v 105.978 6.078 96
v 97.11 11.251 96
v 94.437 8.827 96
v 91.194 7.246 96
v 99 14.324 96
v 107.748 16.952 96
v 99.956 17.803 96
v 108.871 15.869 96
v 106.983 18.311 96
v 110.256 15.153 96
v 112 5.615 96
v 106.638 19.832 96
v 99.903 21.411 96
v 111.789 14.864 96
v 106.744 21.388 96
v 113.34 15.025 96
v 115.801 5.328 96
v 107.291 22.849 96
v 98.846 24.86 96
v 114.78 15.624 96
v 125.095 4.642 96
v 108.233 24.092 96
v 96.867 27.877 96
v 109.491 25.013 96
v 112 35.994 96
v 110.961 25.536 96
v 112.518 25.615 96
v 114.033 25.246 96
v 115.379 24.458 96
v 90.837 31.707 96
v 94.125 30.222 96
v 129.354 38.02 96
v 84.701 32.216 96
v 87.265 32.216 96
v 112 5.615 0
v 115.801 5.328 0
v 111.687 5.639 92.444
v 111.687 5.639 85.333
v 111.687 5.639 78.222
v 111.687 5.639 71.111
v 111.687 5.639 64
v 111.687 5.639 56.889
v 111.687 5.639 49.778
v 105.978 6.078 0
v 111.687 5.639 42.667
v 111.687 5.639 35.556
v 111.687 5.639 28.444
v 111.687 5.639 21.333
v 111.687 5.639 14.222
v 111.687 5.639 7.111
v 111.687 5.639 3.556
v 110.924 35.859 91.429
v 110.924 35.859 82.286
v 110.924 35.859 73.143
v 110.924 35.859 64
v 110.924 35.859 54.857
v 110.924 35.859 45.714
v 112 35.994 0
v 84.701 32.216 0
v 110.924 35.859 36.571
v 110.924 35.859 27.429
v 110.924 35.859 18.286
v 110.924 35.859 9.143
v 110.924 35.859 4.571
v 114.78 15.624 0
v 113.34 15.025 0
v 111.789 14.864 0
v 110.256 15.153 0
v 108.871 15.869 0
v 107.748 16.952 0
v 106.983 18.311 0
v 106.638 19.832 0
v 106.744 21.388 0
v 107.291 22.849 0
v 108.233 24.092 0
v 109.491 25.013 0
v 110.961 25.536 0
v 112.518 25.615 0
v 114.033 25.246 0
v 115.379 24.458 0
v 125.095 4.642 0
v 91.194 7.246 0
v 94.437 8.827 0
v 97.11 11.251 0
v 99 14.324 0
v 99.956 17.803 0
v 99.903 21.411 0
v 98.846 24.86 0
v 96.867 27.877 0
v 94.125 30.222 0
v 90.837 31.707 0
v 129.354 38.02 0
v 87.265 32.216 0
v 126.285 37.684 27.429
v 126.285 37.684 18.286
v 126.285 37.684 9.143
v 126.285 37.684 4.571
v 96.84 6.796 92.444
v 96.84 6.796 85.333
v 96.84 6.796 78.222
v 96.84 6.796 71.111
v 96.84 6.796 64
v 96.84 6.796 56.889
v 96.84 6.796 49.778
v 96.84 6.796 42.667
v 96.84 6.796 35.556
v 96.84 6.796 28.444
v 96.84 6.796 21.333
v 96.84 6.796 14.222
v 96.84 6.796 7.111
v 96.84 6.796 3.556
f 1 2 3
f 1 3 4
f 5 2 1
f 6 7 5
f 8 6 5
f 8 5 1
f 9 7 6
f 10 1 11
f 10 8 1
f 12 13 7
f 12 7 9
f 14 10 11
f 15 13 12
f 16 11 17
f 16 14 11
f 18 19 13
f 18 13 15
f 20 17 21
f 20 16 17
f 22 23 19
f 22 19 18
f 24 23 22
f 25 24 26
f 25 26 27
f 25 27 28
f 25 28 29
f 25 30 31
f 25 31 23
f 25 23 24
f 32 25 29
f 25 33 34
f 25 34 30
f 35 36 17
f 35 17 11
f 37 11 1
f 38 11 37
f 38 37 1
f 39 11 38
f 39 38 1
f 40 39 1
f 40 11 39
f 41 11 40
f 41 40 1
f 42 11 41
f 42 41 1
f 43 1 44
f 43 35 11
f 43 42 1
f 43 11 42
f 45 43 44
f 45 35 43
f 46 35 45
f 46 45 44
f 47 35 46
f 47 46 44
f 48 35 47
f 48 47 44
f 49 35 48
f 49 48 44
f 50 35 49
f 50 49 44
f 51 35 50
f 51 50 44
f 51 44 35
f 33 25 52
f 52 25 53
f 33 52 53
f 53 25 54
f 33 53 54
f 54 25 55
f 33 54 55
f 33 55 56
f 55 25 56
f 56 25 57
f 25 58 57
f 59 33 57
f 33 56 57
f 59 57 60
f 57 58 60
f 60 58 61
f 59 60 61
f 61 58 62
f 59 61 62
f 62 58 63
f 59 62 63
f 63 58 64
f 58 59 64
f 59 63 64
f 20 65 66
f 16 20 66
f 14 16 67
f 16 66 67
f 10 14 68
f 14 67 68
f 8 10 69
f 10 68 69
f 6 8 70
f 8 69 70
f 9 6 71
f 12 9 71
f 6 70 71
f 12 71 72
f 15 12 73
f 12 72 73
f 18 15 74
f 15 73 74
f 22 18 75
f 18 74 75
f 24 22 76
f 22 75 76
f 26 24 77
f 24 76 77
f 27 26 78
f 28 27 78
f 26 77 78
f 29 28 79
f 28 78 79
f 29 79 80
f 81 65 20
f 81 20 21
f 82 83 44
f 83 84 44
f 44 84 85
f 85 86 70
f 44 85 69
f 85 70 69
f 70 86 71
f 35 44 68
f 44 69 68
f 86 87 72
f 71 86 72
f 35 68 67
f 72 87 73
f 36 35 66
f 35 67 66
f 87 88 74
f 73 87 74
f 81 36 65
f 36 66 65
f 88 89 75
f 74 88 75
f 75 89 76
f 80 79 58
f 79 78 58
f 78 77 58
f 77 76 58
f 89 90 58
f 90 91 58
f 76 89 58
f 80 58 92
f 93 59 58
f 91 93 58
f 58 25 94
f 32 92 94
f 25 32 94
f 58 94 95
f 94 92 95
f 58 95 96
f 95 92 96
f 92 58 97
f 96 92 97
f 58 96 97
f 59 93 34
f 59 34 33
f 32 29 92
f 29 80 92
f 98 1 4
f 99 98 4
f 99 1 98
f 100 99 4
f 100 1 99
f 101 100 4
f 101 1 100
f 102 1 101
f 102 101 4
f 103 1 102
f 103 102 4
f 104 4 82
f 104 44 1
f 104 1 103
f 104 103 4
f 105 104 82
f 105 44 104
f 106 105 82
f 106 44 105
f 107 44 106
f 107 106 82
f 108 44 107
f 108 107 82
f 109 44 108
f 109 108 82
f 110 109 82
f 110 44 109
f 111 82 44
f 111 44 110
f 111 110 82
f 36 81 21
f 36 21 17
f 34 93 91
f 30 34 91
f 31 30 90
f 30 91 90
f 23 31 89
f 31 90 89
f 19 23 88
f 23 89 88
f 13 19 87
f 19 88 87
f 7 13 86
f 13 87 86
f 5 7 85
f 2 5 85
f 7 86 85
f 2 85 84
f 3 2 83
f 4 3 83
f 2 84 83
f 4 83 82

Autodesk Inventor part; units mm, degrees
ref_plane "YZ Plane" through (0, 0, 0) normal (1, 0, 0) x (0, 1, 0)
ref_plane "XZ Plane" through (0, 0, 0) normal (0, 1, 0) x (-1, 0, 0)
ref_plane "XY Plane" through (0, 0, 0) normal (0, 0, 1) x (1, 0, 0)
sketch "Sketch1" plane through (0, 0, 0) normal (0, 0, 1) x (1, 0, 0)
  spline S0 degree 4 poles (254.4361, 38.2581) (252.1599, 38.6503) (246.7887, 39.4993) (237.9849, 40.6183) (225.3575, 41.7043) (211.2027, 42.3417) (196.3926, 42.4701) (181.0313, 42.0702) (165.5064, 41.2217) (149.7852, 40.0448) (134.1096, 38.5775) (118.6247, 36.8508) (103.5, 34.9393) (88.9016, 32.8834) (74.9958, 30.7382) (61.9178, 28.5627) (49.8271, 26.4098) (38.8354, 24.34) (29.0772, 22.4039) (20.6323, 20.6564) (13.6456, 19.1491) (6.9132, 17.6607) (2.9022, 16.74) (0.4691, 16.1882) (0, 16.065) knots 0.214297 0.214297 0.214297 0.214297 0.214297 0.24332 0.281775 0.321542 0.36238 0.404005 0.446178 0.488665 0.531231 0.573688 0.615803 0.657336 0.698047 0.737682 0.775986 0.812688 0.847495 0.880087 0.910093 0.937059 0.960363 1 1 1 1 1
  spline S1 degree 4 poles (300, 15.624) (299.8057, 13.313) (297.7085, 10.3432) (293.0509, 7.5008) (285.3959, 4.883) (278.1124, 3.2165) (269.5147, 1.8925) (259.681, 0.913) (248.7129, 0.2783) (236.7119, -0.0309) (223.8067, -0.0504) (210.1253, 0.1933) (195.7754, 0.645) (180.9677, 1.2494) (165.6517, 1.9825) (150.1916, 2.9048) (134.6873, 3.9451) (119.3375, 5.0495) (104.3042, 6.1987) (89.7566, 7.3561) (75.8492, 8.4887) (62.7429, 9.5824) (50.5811, 10.6226) (39.4971, 11.5797) (29.6294, 12.4513) (21.0712, 13.2264) (13.9639, 13.8721) (7.1036, 14.5126) (2.9683, 14.8997) (0.533, 15.1397) (-0.0042, 15.1841) knots 0 0 0 0 0 0.054372 0.079821 0.107912 0.138499 0.171341 0.206187 0.242784 0.280891 0.320277 0.360713 0.402023 0.443985 0.486373 0.528958 0.57146 0.613642 0.655265 0.696085 0.735853 0.774308 0.811174 0.846157 0.87893 0.909115 0.936252 0.959711 1 1 1 1 1
  arc A0 (0, 16.065) -> (-0.0042, 15.1841) centre (0.1158, 15.624) ccw
  line L0 (0.1158, 15.624) -> (227.9902, 15.624) construction
  line L1 (300, 15.624) -> (0.1158, 15.624) construction
  line L2 (300, 15.624) -> (200, 15.624) construction
  line L3 (200, 15.624) -> (200, 42.3773) construction
  line L4 (200, 15.624) -> (200, 0.5273)
  line L5 (0, 0) -> (0, 20.241)
  line L6 (0, 20.241) -> (238.581, 20.241) construction
  circle A1 centre (238.581, 20.241) radius 14
  line L7 (238.581, 20.241) -> (208.581, 20.241)
  line L8 (238.581, 25.359) -> (238.581, 20.241)
  line L9 (0, 20.241) -> (112, 20.241) construction
  line L10 (0, 15.624) -> (112, 15.624) construction
  line L11 (0, 15.624) -> (112, 15.624) construction
  line L12 (112, 15.624) -> (112, 35.9945)
  line L13 (112, 15.624) -> (112, 5.6153)
  spline S2 degree 4 poles (299.2852, 20.241) (299.2279, 20.1316) (299.168, 20.0232) (299.1056, 19.9158) (299.0406, 19.8092) knots 0.014818 0.014818 0.014818 0.014818 0.014818 0.017711 0.017711 0.017711 0.017711 0.017711
  line L14 (299.2071, 20.0822) -> (298.8742, 19.5363) construction
  arc A2 (298.904, 19.5932) -> (299.1702, 20.0296) centre (292.2911, 23.9254) ccw construction
  line L15 (299.432, 20.5214) -> (299.1384, 19.9606) construction
  arc A3 (299.1639, 20.0188) -> (299.3987, 20.4672) centre (292.801, 23.6361) ccw construction
  spline S3 degree 2 poles (295.8506, 16.56) (295.1573, 16.0692) (294.3933, 15.624) knots 0 0 0 1 1 1
  line L16 (294.5507, 15.7157) -> (294.2359, 15.5323) construction
  arc A4 (294.2672, 15.5511) -> (294.519, 15.6978) centre (283.8844, 33.657) ccw construction
  spline S4 degree 4 poles (296.8569, 15.624) (296.6183, 15.8629) (296.3707, 16.0985) (296.1147, 16.3309) (295.8506, 16.56) knots 0.044099 0.044099 0.044099 0.044099 0.044099 0.050856 0.050856 0.050856 0.050856 0.050856
  spline S5 degree 4 poles (219.5872, 34.9119) (218.6954, 34.952) (214.8585, 35.1063) (210.7072, 35.3295) (192.898, 35.4464) (181.4278, 35.0555) (165.1774, 34.1819) (149.5619, 33.1267) (133.8284, 31.3479) (128.2654, 31.0974) (123.3908, 30.59) knots 0 0 0 0 0 0.139244 0.23322 0.363937 0.509983 0.657115 0.798105 1 1 1 1 1
  line L17 (295.9593, 16.4657) -> (295.7419, 16.6543) construction
  arc A5 (295.9374, 16.4843) -> (295.7635, 16.6352) centre (281.8729, 0.4516) ccw construction
  line L18 (232.7438, 34.3645) -> (201.1936, 35.6815) construction
  arc A6 (229.5868, 34.4549) -> (204.3471, 35.5085) centre (136.3483, -1896.3245) ccw construction
  arc A7 (264.2661, 15.123) -> (264.3608, 15.624) centre (238.581, 20.241) ccw
  circle A8 centre (238.581, 20.241) radius 24
  circle A9 centre (112, 20.241) radius 15.39
  spline S6 degree 4 poles (300, 15.624) (300.2691, 17.9337) (298.7834, 21.2677) (294.6934, 24.9798) (287.5317, 28.9406) (280.4869, 31.8205) (271.481, 34.7182) (262.4868, 36.793) (257.7004, 37.6957) (254.4361, 38.2581) knots 0 0 0 0 0 0.247555 0.363857 0.49255 0.632996 0.778264 1 1 1 1 1
  line L19 (285.2945, 32.941) -> (223.5776, 43.5753) construction
  arc A10 (278.7224, 32.6349) -> (229.6682, 41.0872) centre (217.2184, -177.7386) ccw construction
  line L20 (285.2945, 32.941) -> (223.5776, 43.5753) construction
  arc A11 (278.8771, 33.0418) -> (229.6586, 41.5224) centre (200.8949, -272.4733) ccw construction
  spline S7 degree 4 poles (251.493, 31.7362) (243.7009, 32.9676) (232.1602, 34.2966) (216.4428, 35.2879) (196.3923, 35.4611) (181.0317, 35.0615) (165.5053, 34.2127) (149.7883, 33.0365) (134.1012, 31.5672) (118.6474, 29.8462) (103.4397, 27.9193) (89.0589, 25.9037) (74.8371, 23.6927) (62.4884, 21.6695) (49.6399, 19.3545) (46.3795, 18.7429) (43.8125, 18.259) knots 0 0 0 0 0 0.163963 0.232338 0.302031 0.372642 0.443778 0.515047 0.586134 0.656647 0.726187 0.794348 0.86071 0.920346 1 1 1 1 1 construction
  spline S8 degree 4 poles (295.845, 16.556) (295.7198, 16.6646) (294.585, 17.6283) (292.0585, 19.4283) (287.5167, 21.9347) (280.467, 24.8321) (271.9714, 27.5226) (264.2087, 29.4004) (258.4092, 30.5515) (255.0536, 31.1429) (254.4361, 31.2493) (253.9689, 31.3298) (253.5018, 31.4103) (253.0347, 31.4908) (252.5676, 31.5712) knots 0.050892 0.050892 0.050892 0.050892 0.050892 0.054094 0.079507 0.107628 0.138317 0.171335 0.206423 0.214297 0.214297 0.214297 0.214297 0.220253 0.220253 0.220253 0.220253 0.220253
  line L21 (285.2945, 25.9322) -> (223.5776, 36.5664) construction
  line L22 (285.2945, 25.9322) -> (223.5776, 36.5664) construction
  arc A12 (278.7224, 25.626) -> (229.6682, 34.0784) centre (217.2184, -184.7474) ccw construction
  line L23 (270.129, 9.1254) -> (275.129, 9.1254) construction
  line L24 (281.07, 24.4582) -> (286.07, 24.4582) construction
  line L25 (318.8214, -3.3673) -> (272.8686, 36.4793) construction
  arc A13 (303.2079, 0.552) -> (278.9595, 21.5782) centre (281.8576, 0.4252) ccw construction
  spline S9 degree 4 poles (295.8353, 16.5644) (293.4171, 14.8846) (288.4135, 12.6926) (280.7063, 10.6698) (269.511, 8.9398) (259.6826, 7.9632) (248.7122, 7.3273) (236.7121, 7.0186) (223.8065, 6.9989) (210.1254, 7.2427) (195.7753, 7.6944) (180.968, 8.2987) (165.6509, 9.032) (150.1939, 9.954) (134.681, 10.995) (119.3545, 12.0974) (104.259, 13.2519) (89.8748, 14.3954) (75.7524, 15.5471) (62.9065, 16.6165) (50.5107, 17.6776) (46.5166, 18.0246) (43.8125, 18.259) knots 0 0 0 0 0 0.084767 0.124025 0.166179 0.210904 0.257877 0.306788 0.35734 0.409241 0.462263 0.516122 0.570528 0.625186 0.679738 0.73388 0.787304 0.839697 0.89074 0.937143 1 1 1 1 1
  spline S10 degree 4 poles (21.4623, 20.241) (20.6227, 20.317) (20.124, 20.3622) (19.9191, 20.3809) (19.554, 20.414) knots 0.979732 0.979732 0.979732 0.979732 0.979732 1 1 1 1 1 construction
  line L26 (68.4884, 16.1198) -> (19.1367, 20.3983) construction
  arc A14 (63.5515, 16.5281) -> (24.0702, 19.9509) centre (-819.8994, -9944.3712) ccw construction
  line L27 (21.7244, 20.2173) -> (21.2001, 20.2647) construction
  arc A15 (21.2525, 20.26) -> (21.672, 20.222) centre (898.6358, 9712.9556) ccw construction
  line L28 (74.2541, 23.9969) -> (13.371, 12.5211) construction
  arc A16 (68.1759, 22.7939) -> (19.47, 13.6134) centre (1053.3901, -5337.891) ccw construction
  spline S11 degree 4 poles (218.4375, 7.1934) (217.6173, 7.2408) (213.8192, 7.4688) (209.5863, 6.8507) (192.5485, 7.9441) (181.1469, 8.163) (165.7461, 9.0283) (149.1424, 9.8801) (139.9777, 10.7519) (129.1073, 11.2464) (124.6867, 11.5289) knots 0 0 0 0 0 0.127631 0.213723 0.333628 0.467446 0.602621 0.738424 0.880395 0.880395 0.880395 0.880395 0.880395 construction
  line L29 (133.5337, 10.9635) -> (115.8396, 12.0942) construction
  arc A17 (117.618, 12.0789) -> (131.7678, 11.1747) centre (141.027, 267.2384) ccw construction
  line L30 (140.665, 32.3881) -> (106.1166, 28.792) construction
  arc A18 (137.222, 31.4497) -> (109.679, 28.5828) centre (140.6225, -134.9596) ccw construction
  circle A19 centre (238.581, 20.241) radius 18
  line L31 (238.581, 38.241) -> (225.78, 41.559)
  line L32 (238.581, 2.241) -> (224.22, 0)
  line L33 (214.581, 20.241) -> (214.581, 42.1266) construction
  line L34 (127.39, 20.241) -> (127.39, 11.5255) construction
  line L35 (127.39, 20.241) -> (131.3139, 20.241) construction
  line L36 (96.61, 20.241) -> (96.61, 13.8631) construction
  line L37 (270.129, 5.6153) -> (270.129, 15.624) construction
  line L38 (272.129, 7.6153) -> (272.129, 13.624)
  line L39 (268.129, 13.624) -> (268.129, 7.6153)
  arc A20 (268.129, 7.6153) -> (272.129, 7.6153) centre (270.129, 7.6153) ccw
  arc A21 (272.129, 13.624) -> (268.129, 13.624) centre (270.129, 13.624) ccw
  line L40 (270.129, 32.1807) -> (270.129, 22.172) construction
  line L41 (272.129, 30.1807) -> (272.129, 24.172)
  line L42 (268.129, 24.172) -> (268.129, 30.1807)
  arc A22 (272.129, 30.1807) -> (268.129, 30.1807) centre (270.129, 30.1807) ccw
  arc A23 (268.129, 24.172) -> (272.129, 24.172) centre (270.129, 24.172) ccw
  arc A24 (200, 42.3155) -> (199.8539, 42.3773) centre (190.581, 20.241) ccw
  arc A25 (171.273, 34.4958) -> (171.2681, 34.4892) centre (190.581, 20.241) ccw
  arc A26 (210.7484, 7.2304) -> (209.2875, 35.2765) centre (190.581, 20.241) ccw
  arc A27 (169.4455, 8.8703) -> (169.4744, 8.8168) centre (190.581, 20.241) ccw
  arc A28 (153.9768, 9.6824) -> (154.0303, 9.7394) centre (142.78, 20.241) ccw
  arc A29 (151.2419, 33.0959) -> (151.2193, 33.1107) centre (142.78, 20.241) ccw
  arc A30 (132.1299, 31.3508) -> (130.3229, 11.2037) centre (142.78, 20.241) ccw
  arc A31 (66.334, 16.3348) -> (66.5389, 15.624) centre (81.22, 20.241) ccw
  line L43 (112, 20.241) -> (112, 14.851) construction
  line L44 (112, 14.851) -> (91.265, 14.851) construction
  line L45 (112, 20.241) -> (87.265, 20.241) construction
  line L46 (87.265, 20.241) -> (87.265, 19.422) construction
  circle A32 centre (87.265, 19.422) radius 12.794
  line L47 (87.265, 32.216) -> (84.7014, 32.216)
  circle A33 centre (112.0123, 20.2492) radius 5.39
  line L48 (122.5954, 17.6185) -> (122.5954, 13.8685)
  line L49 (122.5954, 21.3685) -> (122.5954, 13.8685)
  line L50 (127.5954, 13.8685) -> (127.5954, 21.3685)
  line L51 (122.5954, 13.8685) -> (127.5954, 13.8685)
  line L52 (127.5954, 21.3685) -> (122.5954, 21.3685)
  line L53 (112.0123, 20.2492) -> (146.6953, 20.2492) construction
  line L54 (167.5954, 17.6185) -> (170.0954, 17.6185) construction
  line L55 (167.5954, 17.6185) -> (167.5954, 21.3685)
  line L56 (167.5954, 13.8685) -> (167.5954, 21.3685)
  line L57 (162.5954, 13.8685) -> (167.5954, 13.8685)
  line L58 (162.5954, 21.3685) -> (162.5954, 13.8685)
  line L59 (167.5954, 21.3685) -> (162.5954, 21.3685)
  line L60 (146.5954, 17.6185) -> (170.5954, 17.6185) construction
  line L61 (146.5954, 17.6185) -> (167.5954, 17.6185) construction
  arc A34 (179.5651, 35.2547) -> (178.1042, 7.2085) centre (198.2716, 20.2192) ccw
  line L62 (115.3793, 24.4582) -> (129.3538, 38.0195)
  line L63 (115.3793, 16.0238) -> (129.3538, 2.4625)
  line L64 (114.78, 15.624) -> (125.0954, 4.6416)
  point P0 (0.783, 16.254)
  point P1 (3.213, 16.812)
  point P2 (7.239, 17.724)
  point P3 (12.813, 18.96)
  point P4 (19.884, 20.484)
  point P5 (28.374, 22.245)
  point P6 (38.199, 24.195)
  point P7 (49.254, 26.28)
  point P8 (61.419, 28.446)
  point P9 (74.571, 30.636)
  point P10 (88.56, 32.793)
  point P11 (103.242, 34.86)
  point P12 (118.455, 36.783)
  point P13 (134.028, 38.511)
  point P14 (149.793, 39.984)
  point P15 (165.576, 41.16)
  point P16 (181.206, 41.985)
  point P17 (196.638, 42.363)
  point P18 (211.554, 42.222)
  point P19 (239.145, 40.389)
  point P20 (262.68, 36.666)
  point P21 (272.577, 34.218)
  point P22 (281.07, 31.467)
  point P23 (288.069, 28.491)
  point P24 (293.505, 25.359)
  point P25 (297.324, 22.137)
  point P26 (300, 15.624)
  point P27 (0.861, 15.105)
  point P28 (3.342, 14.868)
  point P29 (7.446, 14.481)
  point P30 (13.122, 13.953)
  point P31 (20.31, 13.296)
  point P32 (28.92, 12.519)
  point P33 (38.856, 11.64)
  point P34 (50.007, 10.674)
  point P35 (62.244, 9.63)
  point P36 (75.429, 8.529)
  point P37 (89.418, 7.389)
  point P38 (104.052, 6.228)
  point P39 (119.172, 5.076)
  point P40 (134.613, 3.966)
  point P41 (150.207, 2.928)
  point P42 (165.783, 2.013)
  point P43 (181.167, 1.263)
  point P44 (196.068, 0.663)
  point P45 (210.468, 0.225)
  point P46 (237.189, 0.039)
  point P47 (249.246, 0.378)
  point P48 (260.262, 1.05)
  point P49 (270.129, 2.076)
  point P50 (278.739, 3.462)
  point P51 (285.993, 5.211)
  point P52 (291.81, 7.314)
  point P53 (296.121, 9.756)
  point P54 (298.863, 12.531)
  point P55 (200, 15.624)
  point P56 (225.3642, 15.624)
  point P57 (238.581, 6.241)
  point P58 (238.581, 34.241)
  point P59 (225.3642, 15.624)
  point P60 (251.7978, 15.624)
  point P61 (0, 16.065)
  point P62 (0, 15.1838)
  point P63 (224.581, 20.241)
  point P64 (0, 9.065)
  point P65 (0.783, 9.254)
  point P66 (3.213, 9.812)
  point P67 (7.239, 10.724)
  point P68 (12.813, 11.96)
  point P69 (19.884, 13.484)
  point P70 (28.374, 15.245)
  point P71 (38.199, 17.195)
  point P72 (49.254, 19.28)
  point P73 (61.419, 21.446)
  point P74 (74.571, 23.636)
  point P75 (88.56, 25.793)
  point P76 (103.242, 27.86)
  point P77 (118.455, 29.783)
  point P78 (134.028, 31.511)
  point P79 (149.793, 32.984)
  point P80 (165.576, 34.16)
  point P81 (181.206, 34.985)
  point P82 (225.78, 34.559)
  point P83 (239.145, 33.389)
  point P84 (251.493, 31.745)
  point P85 (262.68, 29.666)
  point P86 (272.577, 27.218)
  point P87 (281.07, 24.467)
  point P88 (288.069, 21.491)
  point P89 (293.505, 18.359)
  point P90 (297.324, 15.137)
  point P91 (299.493, 11.879)
  point P92 (300, 8.624)
  point P93 (-0.0042, 22.1841)
  point P94 (0.861, 22.105)
  point P95 (3.342, 21.868)
  point P96 (7.446, 21.481)
  point P97 (13.122, 20.953)
  point P98 (20.31, 20.296)
  point P99 (28.92, 19.519)
  point P100 (38.856, 18.64)
  point P101 (50.007, 17.674)
  point P102 (62.244, 16.63)
  point P103 (75.429, 15.529)
  point P104 (89.418, 14.389)
  point P105 (104.052, 13.228)
  point P106 (119.172, 12.076)
  point P107 (134.613, 10.966)
  point P108 (150.207, 9.928)
  point P109 (165.783, 9.013)
  point P110 (181.167, 8.263)
  point P111 (196.068, 7.663)
  point P112 (210.468, 7.225)
  point P113 (224.22, 7)
  point P114 (237.189, 7.039)
  point P115 (249.246, 7.378)
  point P116 (260.262, 8.05)
  point P117 (270.129, 9.076)
  point P118 (278.739, 10.462)
  point P119 (285.993, 12.211)
  point P120 (291.81, 14.314)
  point P121 (296.121, 16.756)
  point P122 (298.863, 19.531)
  point P123 (300, 22.624)
  point P124 (18.7405, 20.241)
  point P125 (216.9687, 35.023)
  point P126 (0, 16.065)
  point P127 (296.8569, 15.624)
  point P128 (294.3933, 15.624)
  point P129 (219.5872, 34.9119)
  point P130 (123.3908, 30.59)
  point P131 (254.4361, 38.2581)
  point P132 (0, 9.0562)
  point P133 (0.783, 9.2452)
  point P134 (3.213, 9.8032)
  point P135 (7.239, 10.7152)
  point P136 (12.813, 11.9512)
  point P137 (19.884, 13.4752)
  point P138 (28.374, 15.2362)
  point P139 (38.199, 17.1862)
  point P140 (49.254, 19.2712)
  point P141 (61.419, 21.4372)
  point P142 (74.571, 23.6272)
  point P143 (88.56, 25.7842)
  point P144 (103.242, 27.8512)
  point P145 (118.455, 29.7742)
  point P146 (134.028, 31.5022)
  point P147 (149.793, 32.9752)
  point P148 (165.576, 34.1512)
  point P149 (181.206, 34.9762)
  point P150 (196.638, 35.3542)
  point P151 (211.554, 35.2132)
  point P152 (225.78, 34.5502)
  point P153 (262.68, 29.6572)
  point P154 (272.577, 27.2092)
  point P155 (297.324, 15.1282)
  point P156 (299.493, 11.8702)
  point P157 (300, 8.6152)
  point P158 (254.4361, 31.2493)
  point P159 (216.8848, -206.3625)
  point P160 (278.8769, 26.0734)
  point P161 (229.5906, 33.8662)
  point P162 (-0.0042, 22.2335)
  point P163 (0.861, 22.1544)
  point P164 (3.342, 21.9174)
  point P165 (7.446, 21.5304)
  point P166 (13.122, 21.0024)
  point P167 (28.92, 19.5684)
  point P168 (38.856, 18.6894)
  point P169 (50.007, 17.7234)
  point P170 (62.244, 16.6794)
  point P171 (75.429, 15.5784)
  point P172 (89.418, 14.4384)
  point P173 (104.052, 13.2774)
  point P174 (119.172, 12.1254)
  point P175 (134.613, 11.0154)
  point P176 (150.207, 9.9774)
  point P177 (165.783, 9.0624)
  point P178 (181.167, 8.3124)
  point P179 (196.068, 7.7124)
  point P180 (210.468, 7.2744)
  point P181 (224.22, 7.0494)
  point P182 (237.189, 7.0884)
  point P183 (249.246, 7.4274)
  point P184 (260.262, 8.0994)
  point P185 (278.739, 10.5114)
  point P186 (285.993, 12.2604)
  point P187 (296.121, 16.8054)
  point P188 (298.863, 19.5804)
  point P189 (300, 22.6734)
  point P190 (225.7, -0.0094)
  point P191 (252.2617, 0.522)
  point P192 (227.3495, 41.4508)
  point P193 (105.9778, 6.0782)
  point P194 (115.8008, 5.3277)
  point P195 (98.26, 27.1738)
  point P196 (260.4522, 30.1228)
  point P197 (123.5853, 30.3718)
  point P198 (134.5979, 31.5604)
  point P199 (134.4982, 31.5502)
  dimension "d63" = 25.588
  dimension "d17" = 100
  dimension "d19" = 20.241
  dimension "d20" = 238.581
  dimension "d21" = 28
  dimension "d37" = 112
  dimension "d39" = 112
  dimension "d40" = 0
  dimension "d43" = 10
  dimension "d55" = 4
  dimension "d56" = 90
  dimension "d58" = 4
  dimension "d59" = 20.735
  dimension "d61" = 24.735
  dimension "d62" = 0.819
  dimension "d64" = 34.683
extrude "Extrusion3" add sketch "Sketch1" along normal blind 96 contours L62 A9 L12 S0 | L12 A9 A32 L47 S0 | L62 A33 L12 A9 | L12 A33 L13 S9 A32 A9 | A33 L64 S9 L13 | S9 L64 A9 S1 L13 | L13 S1 A9 A32 S9 | A9 S1 A32 | L64 S1 A9
properties part number "R10-11 Foam 96"
